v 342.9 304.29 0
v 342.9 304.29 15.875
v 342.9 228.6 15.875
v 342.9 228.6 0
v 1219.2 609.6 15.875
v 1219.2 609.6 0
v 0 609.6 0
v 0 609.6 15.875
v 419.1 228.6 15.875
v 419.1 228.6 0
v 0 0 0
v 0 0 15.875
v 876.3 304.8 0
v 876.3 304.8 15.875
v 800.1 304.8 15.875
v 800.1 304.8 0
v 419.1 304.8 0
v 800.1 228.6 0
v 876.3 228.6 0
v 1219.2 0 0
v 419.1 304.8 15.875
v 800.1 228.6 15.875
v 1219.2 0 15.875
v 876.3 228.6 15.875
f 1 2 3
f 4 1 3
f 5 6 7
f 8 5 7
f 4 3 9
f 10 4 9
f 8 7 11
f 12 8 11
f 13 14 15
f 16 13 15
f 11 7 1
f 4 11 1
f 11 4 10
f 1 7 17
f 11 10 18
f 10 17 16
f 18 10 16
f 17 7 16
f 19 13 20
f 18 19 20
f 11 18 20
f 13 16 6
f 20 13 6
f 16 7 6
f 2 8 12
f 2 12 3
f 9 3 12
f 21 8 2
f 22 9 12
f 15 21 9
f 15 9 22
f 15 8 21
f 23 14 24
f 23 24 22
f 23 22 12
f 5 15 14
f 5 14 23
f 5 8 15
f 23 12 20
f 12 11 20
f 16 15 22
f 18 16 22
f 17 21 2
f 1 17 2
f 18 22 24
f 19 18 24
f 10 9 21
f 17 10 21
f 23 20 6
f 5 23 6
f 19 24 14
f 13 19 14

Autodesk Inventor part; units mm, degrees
ref_plane "YZ Plane" through (0, 0, 0) normal (1, 0, 0) x (0, 1, 0)
ref_plane "XZ Plane" through (0, 0, 0) normal (0, 1, 0) x (-1, 0, 0)
ref_plane "XY Plane" through (0, 0, 0) normal (0, 0, 1) x (1, 0, 0)
sketch "Sketch1" plane through (0, 0, 0) normal (0, 0, 1) x (1, 0, 0)
  line L0 (0, 0) -> (1219.2, 0)
  line L1 (1219.2, 0) -> (1219.2, 609.6)
  line L2 (1219.2, 609.6) -> (0, 609.6)
  line L3 (0, 609.6) -> (0, 0)
  dimension "d0" = 1219.2
  dimension "d1" = 609.6
extrude "Extrusion1" add sketch "Sketch1" along normal blind 15.875
sketch "Sketch2" plane through (0, 0, 15.875) normal (0, 0, 1) x (1, 0, 0)
  line L0 (342.9, 228.6) -> (419.1, 228.6)
  line L1 (419.1, 228.6) -> (419.1, 304.8)
  line L2 (419.1, 304.8) -> (342.9, 304.29)
  line L3 (342.9, 304.29) -> (342.9, 228.6)
  line L4 (876.3, 228.6) -> (876.3, 304.8)
  line L5 (876.3, 304.8) -> (800.1, 304.8)
  line L6 (800.1, 304.8) -> (800.1, 228.6)
  line L7 (800.1, 228.6) -> (876.3, 228.6)
  dimension "d13" = 76.2
  dimension "d15" = 76.2
  dimension "d16" = 76.2
  dimension "d17" = 76.2
extrude "Extrusion2" cut sketch "Sketch2" against normal blind 15.875
properties part number "model 1 window board"
